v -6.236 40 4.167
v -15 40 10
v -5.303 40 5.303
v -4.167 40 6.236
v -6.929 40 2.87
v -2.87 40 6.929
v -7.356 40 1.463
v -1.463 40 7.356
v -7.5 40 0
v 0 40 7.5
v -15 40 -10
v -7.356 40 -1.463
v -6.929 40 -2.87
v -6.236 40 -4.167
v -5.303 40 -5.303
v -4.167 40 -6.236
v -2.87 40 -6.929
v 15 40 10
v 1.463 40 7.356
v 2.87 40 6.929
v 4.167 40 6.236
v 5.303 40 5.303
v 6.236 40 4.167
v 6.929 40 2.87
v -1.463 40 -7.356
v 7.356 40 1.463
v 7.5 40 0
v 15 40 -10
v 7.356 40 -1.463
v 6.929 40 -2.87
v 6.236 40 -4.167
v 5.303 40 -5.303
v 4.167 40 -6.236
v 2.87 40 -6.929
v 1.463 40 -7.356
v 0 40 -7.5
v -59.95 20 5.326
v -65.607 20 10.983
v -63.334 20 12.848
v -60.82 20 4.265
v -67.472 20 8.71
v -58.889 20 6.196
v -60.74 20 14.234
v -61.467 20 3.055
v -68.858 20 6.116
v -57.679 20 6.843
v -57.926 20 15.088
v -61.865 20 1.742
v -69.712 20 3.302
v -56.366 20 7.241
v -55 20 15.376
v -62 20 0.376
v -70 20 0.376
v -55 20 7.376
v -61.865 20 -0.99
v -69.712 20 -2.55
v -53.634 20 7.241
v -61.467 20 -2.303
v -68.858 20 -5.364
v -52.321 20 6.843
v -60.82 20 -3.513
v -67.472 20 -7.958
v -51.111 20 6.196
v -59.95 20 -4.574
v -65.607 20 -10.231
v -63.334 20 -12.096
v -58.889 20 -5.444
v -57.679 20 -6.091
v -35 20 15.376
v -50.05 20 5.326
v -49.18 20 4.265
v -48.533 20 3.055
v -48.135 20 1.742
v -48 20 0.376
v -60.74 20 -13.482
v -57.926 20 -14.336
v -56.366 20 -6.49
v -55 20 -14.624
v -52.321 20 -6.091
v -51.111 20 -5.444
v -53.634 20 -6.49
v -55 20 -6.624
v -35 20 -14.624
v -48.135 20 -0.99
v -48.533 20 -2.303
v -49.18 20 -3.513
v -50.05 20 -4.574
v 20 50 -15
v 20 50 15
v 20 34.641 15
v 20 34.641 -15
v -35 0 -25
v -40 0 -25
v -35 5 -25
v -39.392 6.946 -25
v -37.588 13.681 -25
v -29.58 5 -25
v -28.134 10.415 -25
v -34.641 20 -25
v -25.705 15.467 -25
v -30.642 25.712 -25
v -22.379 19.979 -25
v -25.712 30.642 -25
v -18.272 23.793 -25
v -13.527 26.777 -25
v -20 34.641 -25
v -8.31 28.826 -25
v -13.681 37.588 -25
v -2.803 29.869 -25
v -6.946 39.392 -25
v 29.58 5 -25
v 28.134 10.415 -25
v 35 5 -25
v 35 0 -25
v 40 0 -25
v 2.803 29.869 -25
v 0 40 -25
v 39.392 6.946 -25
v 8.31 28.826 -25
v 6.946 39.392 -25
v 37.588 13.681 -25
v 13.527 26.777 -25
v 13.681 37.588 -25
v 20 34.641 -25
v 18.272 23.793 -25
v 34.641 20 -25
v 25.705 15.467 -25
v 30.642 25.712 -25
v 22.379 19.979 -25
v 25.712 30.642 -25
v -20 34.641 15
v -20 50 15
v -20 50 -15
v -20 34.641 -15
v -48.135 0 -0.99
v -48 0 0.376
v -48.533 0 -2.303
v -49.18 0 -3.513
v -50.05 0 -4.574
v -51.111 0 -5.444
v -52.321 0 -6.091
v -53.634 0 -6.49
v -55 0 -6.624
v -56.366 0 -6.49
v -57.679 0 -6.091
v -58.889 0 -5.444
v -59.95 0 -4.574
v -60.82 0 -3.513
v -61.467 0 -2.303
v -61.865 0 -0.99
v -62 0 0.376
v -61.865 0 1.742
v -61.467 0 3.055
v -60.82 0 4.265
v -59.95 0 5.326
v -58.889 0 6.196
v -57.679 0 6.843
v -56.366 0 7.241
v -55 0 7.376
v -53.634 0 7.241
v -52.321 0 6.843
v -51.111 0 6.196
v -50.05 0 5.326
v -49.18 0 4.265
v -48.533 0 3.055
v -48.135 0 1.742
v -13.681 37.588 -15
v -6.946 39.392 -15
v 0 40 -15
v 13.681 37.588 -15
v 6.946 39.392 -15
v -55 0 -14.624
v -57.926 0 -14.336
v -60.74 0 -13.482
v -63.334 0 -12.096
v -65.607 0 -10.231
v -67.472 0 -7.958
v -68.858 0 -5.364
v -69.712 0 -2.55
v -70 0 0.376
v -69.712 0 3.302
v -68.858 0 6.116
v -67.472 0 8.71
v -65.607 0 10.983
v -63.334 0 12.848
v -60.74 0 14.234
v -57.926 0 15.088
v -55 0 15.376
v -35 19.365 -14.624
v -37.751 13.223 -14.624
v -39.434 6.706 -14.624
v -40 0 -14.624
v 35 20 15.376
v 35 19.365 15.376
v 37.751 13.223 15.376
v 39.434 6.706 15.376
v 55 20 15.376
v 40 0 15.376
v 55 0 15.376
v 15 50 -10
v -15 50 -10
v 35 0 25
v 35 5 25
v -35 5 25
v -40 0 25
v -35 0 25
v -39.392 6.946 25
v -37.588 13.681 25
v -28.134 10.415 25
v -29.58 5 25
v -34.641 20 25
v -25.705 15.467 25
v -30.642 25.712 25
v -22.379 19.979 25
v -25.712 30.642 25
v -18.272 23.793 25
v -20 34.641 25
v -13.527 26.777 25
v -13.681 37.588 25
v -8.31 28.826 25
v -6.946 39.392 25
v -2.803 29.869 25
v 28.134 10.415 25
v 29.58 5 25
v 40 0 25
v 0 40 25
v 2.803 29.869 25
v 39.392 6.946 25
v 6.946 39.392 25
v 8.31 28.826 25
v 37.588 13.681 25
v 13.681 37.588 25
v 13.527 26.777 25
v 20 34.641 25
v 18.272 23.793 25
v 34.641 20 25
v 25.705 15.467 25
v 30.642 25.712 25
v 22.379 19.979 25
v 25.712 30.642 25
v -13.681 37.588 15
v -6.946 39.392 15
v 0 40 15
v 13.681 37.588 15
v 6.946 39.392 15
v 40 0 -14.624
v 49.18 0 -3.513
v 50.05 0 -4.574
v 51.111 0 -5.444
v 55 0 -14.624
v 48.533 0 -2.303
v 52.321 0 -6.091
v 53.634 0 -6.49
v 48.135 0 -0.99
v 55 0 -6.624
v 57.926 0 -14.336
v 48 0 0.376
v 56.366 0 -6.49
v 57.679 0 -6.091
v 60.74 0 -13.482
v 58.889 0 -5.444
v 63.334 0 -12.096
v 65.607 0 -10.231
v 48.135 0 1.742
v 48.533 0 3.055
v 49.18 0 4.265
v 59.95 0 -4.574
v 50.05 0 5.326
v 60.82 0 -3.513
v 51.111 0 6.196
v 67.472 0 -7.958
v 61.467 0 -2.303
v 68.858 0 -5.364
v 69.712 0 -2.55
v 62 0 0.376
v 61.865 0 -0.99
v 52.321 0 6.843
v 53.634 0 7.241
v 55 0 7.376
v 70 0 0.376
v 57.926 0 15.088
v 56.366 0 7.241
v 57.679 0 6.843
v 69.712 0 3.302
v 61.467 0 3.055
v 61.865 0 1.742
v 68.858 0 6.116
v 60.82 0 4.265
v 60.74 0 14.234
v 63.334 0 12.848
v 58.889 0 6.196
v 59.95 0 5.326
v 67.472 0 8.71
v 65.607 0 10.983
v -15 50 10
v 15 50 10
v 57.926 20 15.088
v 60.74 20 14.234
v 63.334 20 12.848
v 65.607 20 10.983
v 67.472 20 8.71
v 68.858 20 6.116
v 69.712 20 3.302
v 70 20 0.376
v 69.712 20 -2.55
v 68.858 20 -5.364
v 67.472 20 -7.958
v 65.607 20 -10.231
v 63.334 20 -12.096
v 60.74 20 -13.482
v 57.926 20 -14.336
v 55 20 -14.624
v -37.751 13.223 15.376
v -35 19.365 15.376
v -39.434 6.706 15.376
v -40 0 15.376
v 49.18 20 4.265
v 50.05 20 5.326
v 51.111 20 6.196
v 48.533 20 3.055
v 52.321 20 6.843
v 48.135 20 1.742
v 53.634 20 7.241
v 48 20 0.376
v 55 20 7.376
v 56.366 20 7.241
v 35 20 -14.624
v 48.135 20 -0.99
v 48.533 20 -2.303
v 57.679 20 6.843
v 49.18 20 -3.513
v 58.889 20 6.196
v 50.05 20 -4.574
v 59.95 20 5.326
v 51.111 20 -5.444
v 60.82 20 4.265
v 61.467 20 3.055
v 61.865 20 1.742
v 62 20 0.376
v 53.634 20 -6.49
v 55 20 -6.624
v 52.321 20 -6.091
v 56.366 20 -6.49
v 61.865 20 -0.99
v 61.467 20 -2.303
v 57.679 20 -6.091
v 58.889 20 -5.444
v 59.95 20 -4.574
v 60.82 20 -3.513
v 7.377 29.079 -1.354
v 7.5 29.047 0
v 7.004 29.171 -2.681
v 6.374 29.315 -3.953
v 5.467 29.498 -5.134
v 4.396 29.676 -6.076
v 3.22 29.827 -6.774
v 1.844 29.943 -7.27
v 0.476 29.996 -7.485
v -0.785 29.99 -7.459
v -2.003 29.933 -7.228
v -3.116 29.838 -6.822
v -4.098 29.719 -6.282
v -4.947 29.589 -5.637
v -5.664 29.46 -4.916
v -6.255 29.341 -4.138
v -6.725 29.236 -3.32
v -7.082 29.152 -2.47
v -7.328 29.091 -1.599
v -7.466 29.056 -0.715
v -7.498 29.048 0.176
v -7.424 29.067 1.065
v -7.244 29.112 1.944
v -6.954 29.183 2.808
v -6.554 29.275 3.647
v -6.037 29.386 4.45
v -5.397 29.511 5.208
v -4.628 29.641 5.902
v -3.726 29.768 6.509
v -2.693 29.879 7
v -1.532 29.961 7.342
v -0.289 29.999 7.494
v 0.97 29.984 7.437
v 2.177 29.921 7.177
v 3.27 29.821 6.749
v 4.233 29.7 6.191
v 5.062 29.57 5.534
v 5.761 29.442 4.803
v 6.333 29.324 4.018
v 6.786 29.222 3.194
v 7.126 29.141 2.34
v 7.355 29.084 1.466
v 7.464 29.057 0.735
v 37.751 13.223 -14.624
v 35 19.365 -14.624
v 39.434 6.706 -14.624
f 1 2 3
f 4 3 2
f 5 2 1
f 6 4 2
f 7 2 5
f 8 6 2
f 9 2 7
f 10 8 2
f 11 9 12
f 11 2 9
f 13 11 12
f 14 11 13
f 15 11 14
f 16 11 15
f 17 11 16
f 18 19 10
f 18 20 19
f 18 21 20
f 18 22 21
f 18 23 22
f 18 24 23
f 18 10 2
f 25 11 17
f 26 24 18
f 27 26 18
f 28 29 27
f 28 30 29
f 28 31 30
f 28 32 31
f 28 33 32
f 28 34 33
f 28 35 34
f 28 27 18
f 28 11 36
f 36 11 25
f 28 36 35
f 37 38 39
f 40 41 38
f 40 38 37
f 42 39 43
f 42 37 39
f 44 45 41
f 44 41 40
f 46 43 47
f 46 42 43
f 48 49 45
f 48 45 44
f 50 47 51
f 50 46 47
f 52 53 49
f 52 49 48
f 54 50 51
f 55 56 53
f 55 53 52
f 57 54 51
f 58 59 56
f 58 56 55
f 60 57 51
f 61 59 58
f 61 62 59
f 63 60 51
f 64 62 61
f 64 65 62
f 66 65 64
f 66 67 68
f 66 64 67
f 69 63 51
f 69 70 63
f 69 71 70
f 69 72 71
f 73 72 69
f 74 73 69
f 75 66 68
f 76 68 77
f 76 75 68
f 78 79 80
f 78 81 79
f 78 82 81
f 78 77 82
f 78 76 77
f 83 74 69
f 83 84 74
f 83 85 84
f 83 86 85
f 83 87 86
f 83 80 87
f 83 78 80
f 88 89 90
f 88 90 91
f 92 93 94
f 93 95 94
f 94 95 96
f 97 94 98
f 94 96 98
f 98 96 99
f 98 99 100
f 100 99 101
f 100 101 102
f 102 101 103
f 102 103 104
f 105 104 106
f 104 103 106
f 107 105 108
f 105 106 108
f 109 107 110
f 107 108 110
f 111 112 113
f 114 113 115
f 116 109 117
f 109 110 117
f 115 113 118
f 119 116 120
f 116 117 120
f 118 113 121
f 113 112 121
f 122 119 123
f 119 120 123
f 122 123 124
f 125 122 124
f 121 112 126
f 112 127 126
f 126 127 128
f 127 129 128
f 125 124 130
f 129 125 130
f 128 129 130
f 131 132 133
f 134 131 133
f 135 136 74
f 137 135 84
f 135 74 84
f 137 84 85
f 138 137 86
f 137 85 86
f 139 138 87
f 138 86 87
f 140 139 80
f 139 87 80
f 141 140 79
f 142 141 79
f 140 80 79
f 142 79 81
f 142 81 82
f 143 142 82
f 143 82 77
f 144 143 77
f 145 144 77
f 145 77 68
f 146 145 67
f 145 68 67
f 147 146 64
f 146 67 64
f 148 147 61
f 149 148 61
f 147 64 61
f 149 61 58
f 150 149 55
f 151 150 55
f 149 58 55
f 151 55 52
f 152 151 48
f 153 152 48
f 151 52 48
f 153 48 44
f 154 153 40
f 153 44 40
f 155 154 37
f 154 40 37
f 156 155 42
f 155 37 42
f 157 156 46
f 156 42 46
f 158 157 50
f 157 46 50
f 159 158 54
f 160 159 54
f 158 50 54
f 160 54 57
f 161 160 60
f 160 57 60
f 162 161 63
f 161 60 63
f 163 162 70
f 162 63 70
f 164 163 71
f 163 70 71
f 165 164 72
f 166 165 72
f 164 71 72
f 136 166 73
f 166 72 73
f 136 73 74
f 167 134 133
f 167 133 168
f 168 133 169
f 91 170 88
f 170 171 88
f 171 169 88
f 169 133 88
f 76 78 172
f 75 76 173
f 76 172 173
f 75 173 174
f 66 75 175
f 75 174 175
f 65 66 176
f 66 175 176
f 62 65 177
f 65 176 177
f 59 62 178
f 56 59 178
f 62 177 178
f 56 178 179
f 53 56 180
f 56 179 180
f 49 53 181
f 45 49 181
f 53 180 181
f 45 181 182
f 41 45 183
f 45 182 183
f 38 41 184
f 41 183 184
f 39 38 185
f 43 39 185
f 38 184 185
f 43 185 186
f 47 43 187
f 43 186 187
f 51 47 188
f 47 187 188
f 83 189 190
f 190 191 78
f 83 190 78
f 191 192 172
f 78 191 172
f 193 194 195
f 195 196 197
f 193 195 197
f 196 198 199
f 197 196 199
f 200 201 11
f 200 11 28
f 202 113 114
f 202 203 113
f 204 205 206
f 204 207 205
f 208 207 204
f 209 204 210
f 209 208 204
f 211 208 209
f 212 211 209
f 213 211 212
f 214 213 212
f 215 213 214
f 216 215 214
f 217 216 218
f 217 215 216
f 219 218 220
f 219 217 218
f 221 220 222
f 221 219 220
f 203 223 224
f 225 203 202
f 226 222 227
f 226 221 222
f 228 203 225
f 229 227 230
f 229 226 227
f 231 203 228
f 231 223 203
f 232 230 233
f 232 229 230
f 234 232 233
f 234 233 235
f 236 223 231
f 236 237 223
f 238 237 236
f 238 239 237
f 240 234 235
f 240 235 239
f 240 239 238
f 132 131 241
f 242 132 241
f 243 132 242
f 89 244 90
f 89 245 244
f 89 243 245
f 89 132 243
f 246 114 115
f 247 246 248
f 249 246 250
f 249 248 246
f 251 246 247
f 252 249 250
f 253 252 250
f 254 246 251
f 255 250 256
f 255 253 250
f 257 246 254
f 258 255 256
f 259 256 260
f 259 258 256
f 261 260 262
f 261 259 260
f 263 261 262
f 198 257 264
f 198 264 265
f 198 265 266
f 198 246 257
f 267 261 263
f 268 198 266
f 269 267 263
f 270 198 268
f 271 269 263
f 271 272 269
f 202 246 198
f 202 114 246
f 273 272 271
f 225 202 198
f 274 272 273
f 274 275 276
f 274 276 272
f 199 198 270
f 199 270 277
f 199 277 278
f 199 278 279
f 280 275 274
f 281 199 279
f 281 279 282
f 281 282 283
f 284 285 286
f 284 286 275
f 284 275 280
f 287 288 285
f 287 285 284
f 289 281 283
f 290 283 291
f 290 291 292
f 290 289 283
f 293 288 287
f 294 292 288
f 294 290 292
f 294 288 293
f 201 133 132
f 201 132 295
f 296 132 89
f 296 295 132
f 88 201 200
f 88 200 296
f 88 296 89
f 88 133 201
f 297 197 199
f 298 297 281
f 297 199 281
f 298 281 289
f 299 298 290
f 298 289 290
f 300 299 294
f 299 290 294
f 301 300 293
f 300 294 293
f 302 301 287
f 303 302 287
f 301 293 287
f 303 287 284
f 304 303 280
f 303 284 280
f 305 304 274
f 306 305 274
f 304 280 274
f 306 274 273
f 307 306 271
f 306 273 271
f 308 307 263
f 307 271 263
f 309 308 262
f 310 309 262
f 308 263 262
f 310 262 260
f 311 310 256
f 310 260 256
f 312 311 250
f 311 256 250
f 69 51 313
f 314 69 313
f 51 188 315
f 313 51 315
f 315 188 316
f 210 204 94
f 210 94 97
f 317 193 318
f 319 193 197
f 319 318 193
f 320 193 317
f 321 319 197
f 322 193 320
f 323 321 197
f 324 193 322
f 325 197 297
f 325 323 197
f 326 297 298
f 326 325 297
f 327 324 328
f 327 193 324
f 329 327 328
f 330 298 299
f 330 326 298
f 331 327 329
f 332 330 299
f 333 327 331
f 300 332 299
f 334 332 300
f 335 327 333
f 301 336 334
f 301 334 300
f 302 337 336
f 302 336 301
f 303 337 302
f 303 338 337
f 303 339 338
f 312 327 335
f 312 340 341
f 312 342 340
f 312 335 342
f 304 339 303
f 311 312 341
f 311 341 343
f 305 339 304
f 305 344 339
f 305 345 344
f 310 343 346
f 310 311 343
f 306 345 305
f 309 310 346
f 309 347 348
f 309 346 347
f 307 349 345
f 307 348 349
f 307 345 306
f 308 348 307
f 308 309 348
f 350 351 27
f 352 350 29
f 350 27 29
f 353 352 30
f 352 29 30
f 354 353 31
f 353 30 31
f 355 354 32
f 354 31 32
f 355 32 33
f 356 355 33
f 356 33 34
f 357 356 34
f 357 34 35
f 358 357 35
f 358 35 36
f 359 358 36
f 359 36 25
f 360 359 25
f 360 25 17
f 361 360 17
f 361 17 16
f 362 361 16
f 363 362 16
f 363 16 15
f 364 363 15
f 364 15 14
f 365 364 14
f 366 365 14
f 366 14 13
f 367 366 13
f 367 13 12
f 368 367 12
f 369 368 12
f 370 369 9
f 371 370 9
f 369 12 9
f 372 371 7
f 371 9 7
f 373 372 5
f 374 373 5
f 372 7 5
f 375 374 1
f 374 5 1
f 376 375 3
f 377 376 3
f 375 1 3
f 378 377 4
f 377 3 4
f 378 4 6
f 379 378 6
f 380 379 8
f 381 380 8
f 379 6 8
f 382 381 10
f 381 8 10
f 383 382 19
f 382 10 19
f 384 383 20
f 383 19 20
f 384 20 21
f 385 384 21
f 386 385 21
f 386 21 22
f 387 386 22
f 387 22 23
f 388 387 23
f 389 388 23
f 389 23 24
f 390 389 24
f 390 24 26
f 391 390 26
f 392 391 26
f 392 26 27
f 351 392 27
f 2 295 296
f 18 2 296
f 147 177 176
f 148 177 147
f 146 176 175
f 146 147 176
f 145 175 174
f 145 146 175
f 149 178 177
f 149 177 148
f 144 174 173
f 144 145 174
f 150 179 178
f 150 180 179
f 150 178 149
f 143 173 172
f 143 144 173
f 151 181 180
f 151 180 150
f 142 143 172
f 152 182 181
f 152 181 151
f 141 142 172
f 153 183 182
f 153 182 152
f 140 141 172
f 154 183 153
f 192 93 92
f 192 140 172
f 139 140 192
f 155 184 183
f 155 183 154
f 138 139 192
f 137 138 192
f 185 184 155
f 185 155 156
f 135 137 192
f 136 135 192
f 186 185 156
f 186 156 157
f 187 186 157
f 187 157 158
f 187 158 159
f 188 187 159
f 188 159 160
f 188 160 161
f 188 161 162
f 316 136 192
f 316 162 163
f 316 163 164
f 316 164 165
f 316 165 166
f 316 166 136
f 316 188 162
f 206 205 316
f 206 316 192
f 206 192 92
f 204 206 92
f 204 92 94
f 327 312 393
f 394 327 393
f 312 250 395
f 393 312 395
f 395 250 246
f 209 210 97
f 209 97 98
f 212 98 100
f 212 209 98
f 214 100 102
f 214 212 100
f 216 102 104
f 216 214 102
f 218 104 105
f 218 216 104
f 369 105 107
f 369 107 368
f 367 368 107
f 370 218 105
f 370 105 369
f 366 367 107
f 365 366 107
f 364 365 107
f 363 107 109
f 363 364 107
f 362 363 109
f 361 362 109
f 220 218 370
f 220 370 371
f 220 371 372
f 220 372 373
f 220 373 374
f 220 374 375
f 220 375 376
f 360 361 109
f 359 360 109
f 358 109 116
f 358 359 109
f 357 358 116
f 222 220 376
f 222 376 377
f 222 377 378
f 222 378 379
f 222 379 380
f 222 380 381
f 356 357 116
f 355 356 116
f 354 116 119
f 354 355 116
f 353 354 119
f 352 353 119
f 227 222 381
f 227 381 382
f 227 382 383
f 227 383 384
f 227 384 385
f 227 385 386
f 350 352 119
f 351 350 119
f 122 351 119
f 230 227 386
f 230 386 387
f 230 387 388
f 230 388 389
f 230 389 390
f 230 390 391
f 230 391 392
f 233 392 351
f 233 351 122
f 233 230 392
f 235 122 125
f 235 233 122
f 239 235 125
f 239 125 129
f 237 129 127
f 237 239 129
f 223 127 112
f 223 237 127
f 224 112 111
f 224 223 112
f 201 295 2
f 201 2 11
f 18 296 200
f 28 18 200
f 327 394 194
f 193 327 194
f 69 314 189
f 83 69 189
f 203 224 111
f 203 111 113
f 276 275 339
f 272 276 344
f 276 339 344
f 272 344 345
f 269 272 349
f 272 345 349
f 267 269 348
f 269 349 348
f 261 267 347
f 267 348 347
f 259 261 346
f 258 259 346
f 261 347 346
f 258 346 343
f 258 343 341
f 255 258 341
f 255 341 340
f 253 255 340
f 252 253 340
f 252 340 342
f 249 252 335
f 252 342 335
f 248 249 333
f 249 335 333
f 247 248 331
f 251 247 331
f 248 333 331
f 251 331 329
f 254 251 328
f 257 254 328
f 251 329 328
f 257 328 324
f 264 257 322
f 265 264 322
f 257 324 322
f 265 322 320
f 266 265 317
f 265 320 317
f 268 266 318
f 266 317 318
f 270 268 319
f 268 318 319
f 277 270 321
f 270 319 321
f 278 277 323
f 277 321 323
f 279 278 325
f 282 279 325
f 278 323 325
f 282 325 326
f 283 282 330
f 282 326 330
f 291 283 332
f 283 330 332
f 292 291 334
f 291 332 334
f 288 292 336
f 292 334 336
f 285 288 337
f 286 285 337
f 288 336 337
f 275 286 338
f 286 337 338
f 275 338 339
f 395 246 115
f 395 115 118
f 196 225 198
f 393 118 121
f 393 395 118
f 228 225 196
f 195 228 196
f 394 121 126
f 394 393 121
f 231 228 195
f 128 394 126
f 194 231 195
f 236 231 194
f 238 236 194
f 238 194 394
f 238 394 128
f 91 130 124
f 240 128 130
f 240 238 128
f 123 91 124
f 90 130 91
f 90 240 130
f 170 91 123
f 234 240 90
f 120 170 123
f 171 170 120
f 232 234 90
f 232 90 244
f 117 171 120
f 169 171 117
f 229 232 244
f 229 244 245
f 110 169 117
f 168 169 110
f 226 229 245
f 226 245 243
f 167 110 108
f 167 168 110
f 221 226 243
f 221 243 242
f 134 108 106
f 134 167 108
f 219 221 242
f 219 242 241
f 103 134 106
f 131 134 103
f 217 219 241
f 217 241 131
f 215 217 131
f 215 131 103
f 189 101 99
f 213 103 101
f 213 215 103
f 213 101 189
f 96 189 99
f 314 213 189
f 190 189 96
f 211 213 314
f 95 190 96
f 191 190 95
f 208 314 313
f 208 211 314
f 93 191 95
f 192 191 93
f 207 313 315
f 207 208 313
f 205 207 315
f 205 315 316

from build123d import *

# Parameters (mm, degrees)
BOSS_EXTRUDE1_DEPTH = 25
BOSS_EXTRUDE3_DEPTH = 20
SKETCH3_R           = 7
CUT_EXTRUDE1_DEPTH  = 20
SKETCH4_R           = 7
CUT_EXTRUDE2_DEPTH  = 20
BOSS_EXTRUDE4_REACH = 52
SKETCH5_W           = 40
SKETCH5_H           = 30
SKETCH6_W           = 30
SKETCH6_H           = 20
CUT_EXTRUDE3_DEPTH  = 10
CUT_EXTRUDE4_REACH  = 42
SKETCH7_R           = 7.5


with BuildPart() as part:
    # Sketch1 → Boss-Extrude1 (new body, symmetric)
    with BuildSketch(Plane.XY):
        with BuildLine():
            Line((-40, 0), (-35, 0))
            Line((-35, 0), (-35, 5))
            Line((-35, 5), (-29.580398915, 5))
            ThreePointArc((-29.580398915, 5), (0, 30), (29.580398915, 5))
            Line((29.580398915, 5), (35, 5))
            Line((35, 5), (35, 0))
            Line((35, 0), (40, 0))
            ThreePointArc((40, 0), (0, 40), (-40, 0))
        make_face()
    extrude(amount=BOSS_EXTRUDE1_DEPTH, both=True)

    # Sketch2 → Boss-Extrude3 (add)
    with BuildSketch(Plane(origin=(0, 0, 0), x_dir=(1, 0, 0), z_dir=(0, 1, 0))):
        with BuildLine():
            Line((35, 14.624040257), (35, -15.375959743))
            Line((35, -15.375959743), (55, -15.375959743))
            ThreePointArc((55, -15.375959743), (70, -0.375959743), (55, 14.624040257))
            Line((55, 14.624040257), (35, 14.624040257))
        make_face()
        with BuildLine():
            Line((-55, -15.375959743), (-35, -15.375959743))
            Line((-35, -15.375959743), (-35, 14.624040257))
            Line((-35, 14.624040257), (-55, 14.624040257))
            ThreePointArc((-55, 14.624040257), (-70, -0.375959743), (-55, -15.375959743))
        make_face()
    extrude(amount=BOSS_EXTRUDE3_DEPTH)

    # Sketch3 → Cut-Extrude1 (cut)
    with BuildSketch(Plane(origin=(0, 20, 0), x_dir=(1, 0, 0), z_dir=(0, 1, 0))):
        with Locations((55, -0.375959743)):
            Circle(SKETCH3_R)
    extrude(amount=-CUT_EXTRUDE1_DEPTH, mode=Mode.SUBTRACT)

    # Sketch4 → Cut-Extrude2 (cut)
    with BuildSketch(Plane(origin=(0, 20, 0), x_dir=(1, 0, 0), z_dir=(0, 1, 0))):
        with Locations((-55, -0.375959743)):
            Circle(SKETCH4_R)
    extrude(amount=-CUT_EXTRUDE2_DEPTH, mode=Mode.SUBTRACT)

    # Sketch5 → Boss-Extrude4 (add, up to next)
    with BuildSketch(Plane(origin=(0, 50, 0), x_dir=(1, 0, 0), z_dir=(0, 1, 0)), mode=Mode.PRIVATE) as boss_extrude4_sk1:
        Rectangle(SKETCH5_W, SKETCH5_H)
    boss_extrude4_tool1 = extrude(boss_extrude4_sk1.sketch, amount=-BOSS_EXTRUDE4_REACH, mode=Mode.PRIVATE) - part.part
    add(boss_extrude4_tool1.solids().sort_by_distance((0, 50, 0))[0])

    # Sketch6 → Cut-Extrude3 (cut)
    with BuildSketch(Plane(origin=(0, 50, 0), x_dir=(1, 0, 0), z_dir=(0, 1, 0))):
        Rectangle(SKETCH6_W, SKETCH6_H)
    extrude(amount=-CUT_EXTRUDE3_DEPTH, mode=Mode.SUBTRACT)

    # Sketch7 → Cut-Extrude4 (cut, up to next)
    with BuildSketch(Plane(origin=(0, 40, 0), x_dir=(1, 0, 0), z_dir=(0, 1, 0)), mode=Mode.PRIVATE) as cut_extrude4_sk1:
        Circle(SKETCH7_R)
    cut_extrude4_tool1 = extrude(cut_extrude4_sk1.sketch, amount=-CUT_EXTRUDE4_REACH, mode=Mode.PRIVATE) & part.part
    add(cut_extrude4_tool1.solids().sort_by_distance((0, 40, 0))[0], mode=Mode.SUBTRACT)


solid = part.part
